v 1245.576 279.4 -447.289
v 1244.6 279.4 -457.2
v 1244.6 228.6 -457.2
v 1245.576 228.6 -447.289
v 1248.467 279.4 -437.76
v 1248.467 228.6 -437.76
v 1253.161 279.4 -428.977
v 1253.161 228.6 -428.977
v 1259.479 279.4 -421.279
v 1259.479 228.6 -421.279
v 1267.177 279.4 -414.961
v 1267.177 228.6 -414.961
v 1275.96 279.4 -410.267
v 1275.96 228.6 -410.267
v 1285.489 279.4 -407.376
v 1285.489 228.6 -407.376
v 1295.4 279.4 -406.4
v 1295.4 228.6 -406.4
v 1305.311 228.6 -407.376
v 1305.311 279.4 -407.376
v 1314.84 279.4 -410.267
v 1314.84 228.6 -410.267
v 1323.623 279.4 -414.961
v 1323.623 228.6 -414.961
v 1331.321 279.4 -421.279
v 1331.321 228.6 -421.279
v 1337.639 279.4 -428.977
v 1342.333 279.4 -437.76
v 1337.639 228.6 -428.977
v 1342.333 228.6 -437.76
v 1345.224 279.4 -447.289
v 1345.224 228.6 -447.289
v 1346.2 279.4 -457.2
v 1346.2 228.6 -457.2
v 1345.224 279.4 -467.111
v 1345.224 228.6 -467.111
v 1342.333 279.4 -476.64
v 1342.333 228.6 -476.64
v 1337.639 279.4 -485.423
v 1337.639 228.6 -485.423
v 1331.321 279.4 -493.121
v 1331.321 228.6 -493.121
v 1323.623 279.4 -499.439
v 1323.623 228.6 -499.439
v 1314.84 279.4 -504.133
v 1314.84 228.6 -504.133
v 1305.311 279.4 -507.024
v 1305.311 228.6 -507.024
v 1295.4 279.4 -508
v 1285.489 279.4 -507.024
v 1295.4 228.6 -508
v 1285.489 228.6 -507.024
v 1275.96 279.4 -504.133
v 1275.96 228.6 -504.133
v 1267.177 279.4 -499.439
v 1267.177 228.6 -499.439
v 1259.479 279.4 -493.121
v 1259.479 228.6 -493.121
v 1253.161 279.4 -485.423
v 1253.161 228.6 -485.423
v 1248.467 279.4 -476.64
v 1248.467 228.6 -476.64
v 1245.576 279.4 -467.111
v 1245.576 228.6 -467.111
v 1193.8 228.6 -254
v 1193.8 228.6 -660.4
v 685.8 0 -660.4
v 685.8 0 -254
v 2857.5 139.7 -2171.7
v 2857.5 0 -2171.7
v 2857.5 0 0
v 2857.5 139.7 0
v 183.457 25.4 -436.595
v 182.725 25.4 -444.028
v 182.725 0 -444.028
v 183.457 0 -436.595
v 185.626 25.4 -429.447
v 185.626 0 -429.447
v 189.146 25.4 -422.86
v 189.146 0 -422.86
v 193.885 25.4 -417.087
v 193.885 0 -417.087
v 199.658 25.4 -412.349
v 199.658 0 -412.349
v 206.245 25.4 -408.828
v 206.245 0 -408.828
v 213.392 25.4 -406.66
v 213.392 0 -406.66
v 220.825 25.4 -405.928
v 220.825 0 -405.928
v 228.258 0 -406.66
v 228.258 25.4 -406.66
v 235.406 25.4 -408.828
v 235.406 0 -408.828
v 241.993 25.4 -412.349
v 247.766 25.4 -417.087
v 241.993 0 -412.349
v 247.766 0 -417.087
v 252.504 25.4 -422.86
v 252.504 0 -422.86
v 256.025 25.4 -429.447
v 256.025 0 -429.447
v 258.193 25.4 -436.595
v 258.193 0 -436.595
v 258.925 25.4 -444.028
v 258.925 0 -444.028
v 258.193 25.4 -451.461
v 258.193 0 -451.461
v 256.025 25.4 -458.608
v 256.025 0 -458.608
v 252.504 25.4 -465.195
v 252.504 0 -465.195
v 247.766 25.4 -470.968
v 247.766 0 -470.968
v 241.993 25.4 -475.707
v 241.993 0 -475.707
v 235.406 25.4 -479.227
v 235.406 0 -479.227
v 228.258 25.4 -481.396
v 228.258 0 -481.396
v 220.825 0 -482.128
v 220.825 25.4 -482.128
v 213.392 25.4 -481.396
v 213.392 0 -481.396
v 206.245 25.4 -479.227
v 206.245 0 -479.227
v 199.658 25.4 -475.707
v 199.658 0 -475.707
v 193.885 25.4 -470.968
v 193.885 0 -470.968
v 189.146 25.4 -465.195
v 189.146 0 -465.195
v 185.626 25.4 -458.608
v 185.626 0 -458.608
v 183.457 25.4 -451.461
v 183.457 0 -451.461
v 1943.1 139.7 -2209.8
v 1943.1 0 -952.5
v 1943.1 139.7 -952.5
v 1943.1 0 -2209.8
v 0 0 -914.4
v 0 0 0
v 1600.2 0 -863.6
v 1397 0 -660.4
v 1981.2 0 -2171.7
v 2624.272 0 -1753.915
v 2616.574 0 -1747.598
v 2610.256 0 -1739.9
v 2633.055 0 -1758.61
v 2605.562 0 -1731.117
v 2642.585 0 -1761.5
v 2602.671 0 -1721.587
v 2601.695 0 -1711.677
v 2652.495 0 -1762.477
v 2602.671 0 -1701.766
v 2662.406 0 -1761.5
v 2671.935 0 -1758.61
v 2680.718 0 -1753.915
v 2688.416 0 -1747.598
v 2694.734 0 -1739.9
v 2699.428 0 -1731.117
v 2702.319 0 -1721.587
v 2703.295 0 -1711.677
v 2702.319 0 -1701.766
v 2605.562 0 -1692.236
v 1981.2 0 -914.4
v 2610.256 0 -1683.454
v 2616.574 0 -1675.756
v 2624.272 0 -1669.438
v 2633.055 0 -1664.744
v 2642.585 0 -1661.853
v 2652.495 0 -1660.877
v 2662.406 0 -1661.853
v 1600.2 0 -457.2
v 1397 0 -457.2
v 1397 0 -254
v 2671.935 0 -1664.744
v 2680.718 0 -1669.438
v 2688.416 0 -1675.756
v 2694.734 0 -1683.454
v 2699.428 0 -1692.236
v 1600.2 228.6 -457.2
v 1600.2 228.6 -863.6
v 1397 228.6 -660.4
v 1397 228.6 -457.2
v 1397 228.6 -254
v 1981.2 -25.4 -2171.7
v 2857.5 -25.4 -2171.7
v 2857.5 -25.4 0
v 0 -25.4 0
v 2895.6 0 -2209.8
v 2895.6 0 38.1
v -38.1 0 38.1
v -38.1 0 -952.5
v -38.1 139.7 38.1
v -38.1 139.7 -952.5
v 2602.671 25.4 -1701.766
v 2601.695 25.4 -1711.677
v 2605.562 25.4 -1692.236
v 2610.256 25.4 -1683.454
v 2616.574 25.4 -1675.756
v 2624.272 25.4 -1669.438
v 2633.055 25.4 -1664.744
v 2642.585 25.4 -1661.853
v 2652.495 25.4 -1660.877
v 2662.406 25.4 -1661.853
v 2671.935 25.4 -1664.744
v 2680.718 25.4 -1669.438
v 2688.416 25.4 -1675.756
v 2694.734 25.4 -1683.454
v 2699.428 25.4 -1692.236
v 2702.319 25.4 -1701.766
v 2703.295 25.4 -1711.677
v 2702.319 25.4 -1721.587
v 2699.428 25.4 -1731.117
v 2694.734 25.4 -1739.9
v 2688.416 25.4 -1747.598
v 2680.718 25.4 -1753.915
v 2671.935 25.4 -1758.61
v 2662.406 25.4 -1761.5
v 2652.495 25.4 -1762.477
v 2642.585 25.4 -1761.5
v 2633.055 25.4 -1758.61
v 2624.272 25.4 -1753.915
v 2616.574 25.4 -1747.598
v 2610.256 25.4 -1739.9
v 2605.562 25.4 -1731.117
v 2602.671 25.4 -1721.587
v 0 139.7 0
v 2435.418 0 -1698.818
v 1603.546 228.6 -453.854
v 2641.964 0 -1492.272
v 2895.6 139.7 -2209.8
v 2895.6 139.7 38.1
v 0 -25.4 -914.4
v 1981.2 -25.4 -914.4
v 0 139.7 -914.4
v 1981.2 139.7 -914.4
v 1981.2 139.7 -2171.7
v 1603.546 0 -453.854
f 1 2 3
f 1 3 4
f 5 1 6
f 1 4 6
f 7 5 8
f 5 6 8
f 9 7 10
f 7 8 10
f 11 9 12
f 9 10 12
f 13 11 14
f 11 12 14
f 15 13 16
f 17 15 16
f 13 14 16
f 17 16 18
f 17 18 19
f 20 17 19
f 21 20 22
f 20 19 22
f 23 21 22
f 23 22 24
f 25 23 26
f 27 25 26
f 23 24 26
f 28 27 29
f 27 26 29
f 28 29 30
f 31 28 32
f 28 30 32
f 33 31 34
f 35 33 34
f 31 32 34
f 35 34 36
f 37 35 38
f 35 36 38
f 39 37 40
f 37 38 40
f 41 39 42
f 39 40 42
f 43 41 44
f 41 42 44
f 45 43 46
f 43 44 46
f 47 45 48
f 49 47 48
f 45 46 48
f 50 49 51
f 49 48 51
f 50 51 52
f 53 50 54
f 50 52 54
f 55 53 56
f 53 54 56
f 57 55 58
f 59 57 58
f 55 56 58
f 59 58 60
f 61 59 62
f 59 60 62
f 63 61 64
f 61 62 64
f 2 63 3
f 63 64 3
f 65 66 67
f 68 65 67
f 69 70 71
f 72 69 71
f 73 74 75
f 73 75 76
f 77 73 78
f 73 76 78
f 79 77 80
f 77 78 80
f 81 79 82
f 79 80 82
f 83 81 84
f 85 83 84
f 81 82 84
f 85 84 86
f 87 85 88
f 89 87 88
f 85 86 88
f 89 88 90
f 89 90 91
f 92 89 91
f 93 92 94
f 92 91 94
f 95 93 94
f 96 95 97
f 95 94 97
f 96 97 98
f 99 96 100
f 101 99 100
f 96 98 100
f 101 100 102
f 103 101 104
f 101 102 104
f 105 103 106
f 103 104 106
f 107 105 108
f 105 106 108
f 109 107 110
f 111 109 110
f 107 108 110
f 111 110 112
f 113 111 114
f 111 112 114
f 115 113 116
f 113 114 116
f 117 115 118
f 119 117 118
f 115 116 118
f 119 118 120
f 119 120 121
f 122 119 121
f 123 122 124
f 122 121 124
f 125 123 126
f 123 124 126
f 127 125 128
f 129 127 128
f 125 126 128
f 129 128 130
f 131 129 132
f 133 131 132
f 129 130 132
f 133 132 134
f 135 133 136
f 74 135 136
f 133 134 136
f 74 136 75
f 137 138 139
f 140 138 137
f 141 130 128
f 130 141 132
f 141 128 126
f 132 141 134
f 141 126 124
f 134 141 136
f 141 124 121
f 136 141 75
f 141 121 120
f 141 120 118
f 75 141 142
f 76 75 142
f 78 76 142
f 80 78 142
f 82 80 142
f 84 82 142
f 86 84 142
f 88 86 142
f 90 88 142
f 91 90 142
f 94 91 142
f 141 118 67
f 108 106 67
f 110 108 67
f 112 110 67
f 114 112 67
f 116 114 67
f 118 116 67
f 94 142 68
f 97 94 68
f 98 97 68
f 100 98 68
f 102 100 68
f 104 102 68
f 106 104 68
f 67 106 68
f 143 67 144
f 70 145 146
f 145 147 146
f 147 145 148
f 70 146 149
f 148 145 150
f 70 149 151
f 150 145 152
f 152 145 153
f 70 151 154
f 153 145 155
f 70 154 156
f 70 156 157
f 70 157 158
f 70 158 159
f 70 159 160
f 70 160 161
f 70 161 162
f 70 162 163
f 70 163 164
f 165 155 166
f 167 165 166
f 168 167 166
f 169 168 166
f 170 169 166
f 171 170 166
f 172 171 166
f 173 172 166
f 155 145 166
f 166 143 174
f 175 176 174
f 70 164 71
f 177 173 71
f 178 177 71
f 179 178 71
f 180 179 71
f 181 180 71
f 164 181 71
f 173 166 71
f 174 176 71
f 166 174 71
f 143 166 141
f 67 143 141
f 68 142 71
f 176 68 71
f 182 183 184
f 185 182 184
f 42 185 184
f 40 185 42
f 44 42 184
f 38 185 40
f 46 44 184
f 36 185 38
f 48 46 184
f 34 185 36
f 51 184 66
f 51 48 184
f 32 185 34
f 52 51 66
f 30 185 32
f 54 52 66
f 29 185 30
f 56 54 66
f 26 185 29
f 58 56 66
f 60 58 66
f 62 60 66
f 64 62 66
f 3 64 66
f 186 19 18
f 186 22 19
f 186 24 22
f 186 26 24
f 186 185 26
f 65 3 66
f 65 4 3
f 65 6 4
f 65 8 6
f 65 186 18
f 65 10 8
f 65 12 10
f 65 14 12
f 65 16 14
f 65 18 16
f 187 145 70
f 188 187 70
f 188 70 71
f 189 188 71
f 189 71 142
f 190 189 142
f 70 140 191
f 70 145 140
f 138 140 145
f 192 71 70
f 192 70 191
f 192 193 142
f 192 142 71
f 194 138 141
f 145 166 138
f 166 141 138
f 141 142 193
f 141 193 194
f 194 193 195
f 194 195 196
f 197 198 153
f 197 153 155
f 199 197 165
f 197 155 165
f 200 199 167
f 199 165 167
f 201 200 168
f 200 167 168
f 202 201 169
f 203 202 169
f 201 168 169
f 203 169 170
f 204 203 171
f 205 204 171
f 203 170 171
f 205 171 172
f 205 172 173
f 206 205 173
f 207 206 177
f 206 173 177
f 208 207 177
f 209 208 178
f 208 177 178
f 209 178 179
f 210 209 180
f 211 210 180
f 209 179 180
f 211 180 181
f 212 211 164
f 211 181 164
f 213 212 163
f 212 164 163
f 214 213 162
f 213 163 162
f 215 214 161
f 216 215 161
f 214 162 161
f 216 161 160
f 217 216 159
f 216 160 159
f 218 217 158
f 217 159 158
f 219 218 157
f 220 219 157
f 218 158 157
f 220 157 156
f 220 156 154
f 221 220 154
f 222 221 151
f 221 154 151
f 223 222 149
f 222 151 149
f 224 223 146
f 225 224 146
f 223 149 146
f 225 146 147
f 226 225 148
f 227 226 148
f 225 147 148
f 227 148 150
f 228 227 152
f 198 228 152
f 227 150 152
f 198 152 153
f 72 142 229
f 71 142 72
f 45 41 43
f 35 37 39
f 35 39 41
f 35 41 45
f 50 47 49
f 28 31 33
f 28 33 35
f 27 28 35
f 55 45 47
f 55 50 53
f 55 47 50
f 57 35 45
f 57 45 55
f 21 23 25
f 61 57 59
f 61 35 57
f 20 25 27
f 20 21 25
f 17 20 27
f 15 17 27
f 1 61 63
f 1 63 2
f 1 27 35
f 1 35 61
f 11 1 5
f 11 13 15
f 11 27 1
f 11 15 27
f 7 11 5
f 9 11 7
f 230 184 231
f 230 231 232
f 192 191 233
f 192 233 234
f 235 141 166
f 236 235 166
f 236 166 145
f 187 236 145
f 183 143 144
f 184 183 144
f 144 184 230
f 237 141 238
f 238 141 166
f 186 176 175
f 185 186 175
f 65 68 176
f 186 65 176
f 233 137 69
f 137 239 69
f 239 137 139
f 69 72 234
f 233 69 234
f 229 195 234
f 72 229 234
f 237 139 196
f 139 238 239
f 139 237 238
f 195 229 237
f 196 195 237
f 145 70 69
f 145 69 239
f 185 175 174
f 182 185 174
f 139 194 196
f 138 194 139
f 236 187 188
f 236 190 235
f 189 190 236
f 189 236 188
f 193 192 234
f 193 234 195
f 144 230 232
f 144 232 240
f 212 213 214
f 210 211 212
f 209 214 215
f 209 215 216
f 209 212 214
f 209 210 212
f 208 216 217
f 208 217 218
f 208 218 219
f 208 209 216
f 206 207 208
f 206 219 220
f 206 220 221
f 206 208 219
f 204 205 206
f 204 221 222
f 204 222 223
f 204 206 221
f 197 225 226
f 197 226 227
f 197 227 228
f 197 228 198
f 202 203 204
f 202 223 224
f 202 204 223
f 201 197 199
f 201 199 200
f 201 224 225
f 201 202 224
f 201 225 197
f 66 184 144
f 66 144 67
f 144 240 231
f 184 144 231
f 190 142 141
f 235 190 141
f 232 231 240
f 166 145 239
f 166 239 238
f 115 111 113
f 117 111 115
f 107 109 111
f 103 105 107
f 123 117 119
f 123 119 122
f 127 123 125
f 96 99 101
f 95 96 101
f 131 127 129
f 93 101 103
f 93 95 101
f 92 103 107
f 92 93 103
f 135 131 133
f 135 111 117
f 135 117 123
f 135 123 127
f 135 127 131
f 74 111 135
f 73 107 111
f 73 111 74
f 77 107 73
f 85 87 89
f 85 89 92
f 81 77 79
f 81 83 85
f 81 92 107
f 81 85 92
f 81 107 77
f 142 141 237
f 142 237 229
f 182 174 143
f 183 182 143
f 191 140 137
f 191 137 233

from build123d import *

# Parameters (mm, degrees)
F0_W      = 152.4
F0_H      = 38.1
F1_DEPTH  = 139.7
F2_W      = 38.1
F2_H      = 914.4
F3_DEPTH  = 139.7
F4_W      = 1828.8
F4_H      = 38.1
F5_DEPTH  = 139.7
F6_W      = 38.1
F6_H      = 1257.3
F6_H_2    = 1219.2
F7_DEPTH  = 139.7
F9_DEPTH  = 25.4
F11_START = 254
F11_DEPTH = 406.4
F13_DEPTH = 228.6
F15_DEPTH = 50.8
F18_DEPTH = 228.6
F19_DEPTH = 228.6
F21_DEPTH = 292.1
F22_R     = 50.8
F23_DEPTH = 25.4
F24_R     = 38.1
F25_DEPTH = 25.4


with BuildPart() as f1:
    # F0 (on Front) → F1 (new body)
    with BuildSketch(Plane.XZ):
        with Locations((76.2, -933.45)):
            Rectangle(F0_W, F0_H)
        Polygon((0, -914.4), (0, 0), (0, 38.1), (-38.1, 38.1), (-38.1, -952.5), (0, -952.5), align=None)
        with Locations((76.2, 19.05)):
            Rectangle(F0_W, F0_H)
    extrude(amount=-F1_DEPTH)

    # F2 (on face) → F3 (join)
    with BuildSketch(Plane.XZ):
        with Locations((2876.55, -457.2)):
            Rectangle(F2_W, F2_H)
        Polygon((2895.6, 38.1), (152.4, 38.1), (152.4, 0), (2857.5, 0), (2895.6, 0), align=None)
    extrude(amount=-F3_DEPTH)

    # F4 (on face) → F5 (join)
    with BuildSketch(Plane.XZ):
        with Locations((1066.8, -933.45)):
            Rectangle(F4_W, F4_H)
    extrude(amount=-F5_DEPTH)

    # F6 (on face) → F7 (join)
    with BuildSketch(Plane.XZ):
        with Locations((2876.55, -1543.05)):
            Rectangle(F6_W, F6_H)
        Polygon((2857.5, -2171.7), (1981.2, -2171.7), (1943.1, -2171.7), (1943.1, -2209.8), (2895.6, -2209.8), (2895.6, -2171.7), align=None)
        with Locations((1962.15, -1562.1)):
            Rectangle(F6_W, F6_H_2)
    extrude(amount=-F7_DEPTH)


with BuildPart() as f9:
    # F8 (on face) → F9 (new body)
    with BuildSketch(Plane.XZ):
        Polygon((0, -914.4), (1981.2, -914.4), (1981.2, -2171.7), (2857.5, -2171.7), (2857.5, 0), (0, 0), align=None)
    extrude(amount=F9_DEPTH)

    # F10 (on face) → F11 (join)
    with BuildSketch(Plane.XY.offset(-914.4).offset(F11_START)):
        Polygon((1193.8, 228.6), (685.8, 0), (990.6, 0), (1193.8, 0), align=None)
    extrude(amount=F11_DEPTH)

    # F12 (on face) → F13 (join)
    with BuildSketch(Plane(origin=(0, 0, 0), x_dir=(-1, 0, 0), z_dir=(0, 1, 0))):
        Polygon((-1320.8, -660.4), (-1193.8, -660.4), (-1193.8, -254), (-1397, -254), (-1397, -660.4), align=None)
    extrude(amount=F13_DEPTH)

    # F14 (on face) → F15 (join)
    with BuildSketch(Plane(origin=(0, 228.6, 0), x_dir=(-1, 0, 0), z_dir=(0, 1, 0))):
        with BuildLine():
            ThreePointArc((-1346.2, -457.2), (-1295.4, -508), (-1244.6, -457.2))
            Line((-1244.6, -457.2), (-1346.2, -457.2))
        make_face()
        with BuildLine():
            Line((-1346.2, -457.2), (-1244.6, -457.2))
            ThreePointArc((-1244.6, -457.2), (-1295.4, -406.4), (-1346.2, -457.2))
        make_face()
    extrude(amount=F15_DEPTH)

    # F16 (on face) → F18 (join)
    with BuildSketch(Plane(origin=(0, 0, 0), x_dir=(-1, 0, 0), z_dir=(0, 1, 0))):
        Polygon((-1600.2, -457.2), (-1397, -660.4), (-1397, -457.2), align=None)
    extrude(amount=F18_DEPTH)

    # F17 (on face) → F19 (join)
    with BuildSketch(Plane(origin=(0, 0, 0), x_dir=(-1, 0, 0), z_dir=(0, 1, 0))):
        Polygon((-1600.2, -457.2), (-1600.2, -660.4), (-1600.2, -863.6), (-1397, -660.4), align=None)
    extrude(amount=F19_DEPTH)

    # F22 (on face) → F23 (join)
    with BuildSketch(Plane(origin=(0, 0, 0), x_dir=(-1, 0, 0), z_dir=(0, 1, 0))):
        with Locations((-2652.4951457977, -1711.6765975952)):
            Circle(F22_R)
    extrude(amount=F23_DEPTH)

    # F24 (on face) → F25 (join)
    with BuildSketch(Plane(origin=(0, 0, 0), x_dir=(-1, 0, 0), z_dir=(0, 1, 0))):
        with Locations((-220.8253741264, -444.0276622772)):
            Circle(F24_R)
    extrude(amount=F25_DEPTH)


with BuildPart() as f21:
    # F20 (on face) → F21 (new body)
    with BuildSketch(Plane(origin=(368.3, 0, 368.3), x_dir=(0, -1, 0), z_dir=(-0.7071067812, 0, -0.7071067812))):
        Polygon((0, -2923.3458042145), (0, -1742.1696874874), (0, -1454.8014916132), (-228.6, -1454.8014916132), align=None)
    extrude(amount=-F21_DEPTH)


solid = Compound([f1.part, f9.part, f21.part])
